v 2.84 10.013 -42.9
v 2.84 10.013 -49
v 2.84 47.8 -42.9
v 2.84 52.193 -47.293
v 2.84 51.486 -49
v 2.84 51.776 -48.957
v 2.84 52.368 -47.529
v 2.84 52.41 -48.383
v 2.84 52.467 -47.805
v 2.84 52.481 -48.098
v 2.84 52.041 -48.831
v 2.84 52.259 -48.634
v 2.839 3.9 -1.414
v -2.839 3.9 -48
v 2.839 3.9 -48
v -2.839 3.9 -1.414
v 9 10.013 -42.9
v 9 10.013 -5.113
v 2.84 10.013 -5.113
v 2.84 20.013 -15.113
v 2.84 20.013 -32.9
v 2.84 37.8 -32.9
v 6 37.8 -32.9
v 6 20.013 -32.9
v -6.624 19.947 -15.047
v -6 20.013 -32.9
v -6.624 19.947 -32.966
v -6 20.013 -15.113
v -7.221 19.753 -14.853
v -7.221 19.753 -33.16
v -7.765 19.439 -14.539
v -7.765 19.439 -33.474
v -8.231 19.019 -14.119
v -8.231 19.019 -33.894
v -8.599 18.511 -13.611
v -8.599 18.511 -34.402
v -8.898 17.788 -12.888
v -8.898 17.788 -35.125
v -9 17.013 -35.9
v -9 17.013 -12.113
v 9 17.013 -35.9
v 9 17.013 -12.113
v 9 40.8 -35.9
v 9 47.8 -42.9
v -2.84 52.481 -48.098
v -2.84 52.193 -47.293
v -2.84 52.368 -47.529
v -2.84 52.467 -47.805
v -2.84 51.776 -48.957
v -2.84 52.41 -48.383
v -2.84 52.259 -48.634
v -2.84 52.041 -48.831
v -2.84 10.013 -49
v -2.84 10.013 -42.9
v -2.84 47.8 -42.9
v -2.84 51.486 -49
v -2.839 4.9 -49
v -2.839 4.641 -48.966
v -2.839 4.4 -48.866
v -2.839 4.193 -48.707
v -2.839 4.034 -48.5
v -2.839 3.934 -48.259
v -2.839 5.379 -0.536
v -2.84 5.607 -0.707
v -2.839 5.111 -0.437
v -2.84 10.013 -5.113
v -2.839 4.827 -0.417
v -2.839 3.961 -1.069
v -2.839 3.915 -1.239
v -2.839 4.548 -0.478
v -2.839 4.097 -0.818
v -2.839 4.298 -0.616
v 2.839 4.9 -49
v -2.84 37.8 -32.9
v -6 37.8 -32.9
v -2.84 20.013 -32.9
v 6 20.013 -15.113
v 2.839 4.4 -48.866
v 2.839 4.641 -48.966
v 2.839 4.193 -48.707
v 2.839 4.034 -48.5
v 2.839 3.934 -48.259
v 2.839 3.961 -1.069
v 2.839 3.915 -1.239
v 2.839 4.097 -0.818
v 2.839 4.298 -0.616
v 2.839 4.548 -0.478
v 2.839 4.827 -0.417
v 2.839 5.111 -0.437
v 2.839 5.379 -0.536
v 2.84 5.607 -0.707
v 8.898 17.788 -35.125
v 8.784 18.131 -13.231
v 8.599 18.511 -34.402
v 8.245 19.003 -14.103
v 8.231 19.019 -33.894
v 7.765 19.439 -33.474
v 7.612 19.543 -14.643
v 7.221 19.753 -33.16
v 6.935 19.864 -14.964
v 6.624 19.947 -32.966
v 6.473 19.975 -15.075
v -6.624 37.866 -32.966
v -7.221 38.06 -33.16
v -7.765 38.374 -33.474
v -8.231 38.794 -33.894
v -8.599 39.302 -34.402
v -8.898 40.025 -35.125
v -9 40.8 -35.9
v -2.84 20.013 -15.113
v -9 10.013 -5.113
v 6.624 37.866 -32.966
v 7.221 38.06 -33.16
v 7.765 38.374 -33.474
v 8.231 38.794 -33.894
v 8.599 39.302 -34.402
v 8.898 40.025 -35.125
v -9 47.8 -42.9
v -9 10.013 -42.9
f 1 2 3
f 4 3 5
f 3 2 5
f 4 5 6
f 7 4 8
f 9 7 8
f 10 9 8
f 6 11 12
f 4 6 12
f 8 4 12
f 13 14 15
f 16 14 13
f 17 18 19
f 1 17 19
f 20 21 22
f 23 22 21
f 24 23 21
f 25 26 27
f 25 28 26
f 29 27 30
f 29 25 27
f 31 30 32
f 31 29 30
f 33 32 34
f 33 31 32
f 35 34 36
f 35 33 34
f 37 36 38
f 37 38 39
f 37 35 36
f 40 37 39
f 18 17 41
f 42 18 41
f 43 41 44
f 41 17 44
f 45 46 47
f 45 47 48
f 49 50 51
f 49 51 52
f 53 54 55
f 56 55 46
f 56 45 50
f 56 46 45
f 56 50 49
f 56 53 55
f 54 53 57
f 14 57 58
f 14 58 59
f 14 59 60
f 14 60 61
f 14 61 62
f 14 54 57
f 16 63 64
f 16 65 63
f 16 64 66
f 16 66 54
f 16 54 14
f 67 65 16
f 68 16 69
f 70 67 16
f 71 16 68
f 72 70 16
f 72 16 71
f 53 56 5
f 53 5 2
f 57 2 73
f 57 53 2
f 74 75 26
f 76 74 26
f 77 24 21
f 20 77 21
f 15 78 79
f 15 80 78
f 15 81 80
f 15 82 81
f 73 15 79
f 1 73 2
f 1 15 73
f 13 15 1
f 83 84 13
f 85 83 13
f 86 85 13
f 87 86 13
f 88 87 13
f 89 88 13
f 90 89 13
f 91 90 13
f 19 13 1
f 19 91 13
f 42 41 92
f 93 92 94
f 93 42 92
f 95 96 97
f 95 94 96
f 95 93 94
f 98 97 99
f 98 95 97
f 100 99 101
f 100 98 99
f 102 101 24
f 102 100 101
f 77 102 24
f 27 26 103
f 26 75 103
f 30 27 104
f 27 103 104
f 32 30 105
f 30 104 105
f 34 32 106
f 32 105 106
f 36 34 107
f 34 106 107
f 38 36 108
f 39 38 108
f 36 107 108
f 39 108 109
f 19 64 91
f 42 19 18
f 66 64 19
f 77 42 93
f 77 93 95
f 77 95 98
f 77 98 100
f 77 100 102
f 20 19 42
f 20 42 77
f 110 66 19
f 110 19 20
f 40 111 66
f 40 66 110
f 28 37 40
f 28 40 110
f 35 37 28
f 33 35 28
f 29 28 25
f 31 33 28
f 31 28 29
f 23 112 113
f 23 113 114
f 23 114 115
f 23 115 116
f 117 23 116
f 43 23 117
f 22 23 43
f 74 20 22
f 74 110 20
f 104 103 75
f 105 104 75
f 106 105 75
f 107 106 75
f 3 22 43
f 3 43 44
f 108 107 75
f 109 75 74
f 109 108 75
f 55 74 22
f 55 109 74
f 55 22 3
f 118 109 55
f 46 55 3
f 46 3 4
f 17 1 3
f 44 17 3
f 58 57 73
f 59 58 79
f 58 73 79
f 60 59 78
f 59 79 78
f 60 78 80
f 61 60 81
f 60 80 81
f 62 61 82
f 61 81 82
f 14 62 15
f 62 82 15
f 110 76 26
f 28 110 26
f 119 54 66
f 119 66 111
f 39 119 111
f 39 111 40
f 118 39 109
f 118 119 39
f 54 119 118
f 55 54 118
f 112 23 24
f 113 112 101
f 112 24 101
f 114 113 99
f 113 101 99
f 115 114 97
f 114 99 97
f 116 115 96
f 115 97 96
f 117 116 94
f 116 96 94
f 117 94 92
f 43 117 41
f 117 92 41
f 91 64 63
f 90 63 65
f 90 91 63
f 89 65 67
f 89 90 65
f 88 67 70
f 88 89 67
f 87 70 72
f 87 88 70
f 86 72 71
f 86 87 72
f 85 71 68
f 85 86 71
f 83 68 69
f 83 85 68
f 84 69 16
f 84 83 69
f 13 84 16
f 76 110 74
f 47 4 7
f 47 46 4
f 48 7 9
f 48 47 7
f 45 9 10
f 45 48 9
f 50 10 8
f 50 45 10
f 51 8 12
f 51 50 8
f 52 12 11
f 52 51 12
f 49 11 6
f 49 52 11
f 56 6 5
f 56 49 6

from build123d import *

# Parameters (mm, degrees)
SKETCH1_R           = 2.1
BOSS_EXTRUDE1_DEPTH = 1
FILLET1_R           = 1
BOSS_EXTRUDE2_DEPTH = 2.84
BOSS_EXTRUDE3_REACH = 76.197
SKETCH9_W           = 18
SKETCH9_H           = 10
SKETCH10_W          = 6.16
SKETCH10_H          = 10
SKETCH10_H_2        = 10.013009375
CUT_EXTRUDE1_DEPTH  = 6.1
BOSS_EXTRUDE4_START = -9
BOSS_EXTRUDE4_DEPTH = 18
CUT_EXTRUDE3_DEPTH  = 75.197102369
FILLET3_R           = 3
FILLET4_R           = 3
FILLET5_R           = 3
FILLET6_R           = 1
FILLET7_R           = 1


# Read off the part's stored shape, not the designer's step: Boss-Extrude4
with BuildPart() as part:
    # Sketch1 → Boss-Extrude1 (new body)
    with BuildSketch(Plane.XY):
        with BuildLine():
            Line((-2.839339828, 3.9), (-5.470710678, 6.53137085))
            ThreePointArc((-5.470710678, 6.53137085), (-5.492387953, 6.563813185), (-5.5, 6.602081528))
            Line((-5.5, 6.602081528), (-5.5, 8.1))
            ThreePointArc((-5.5, 8.1), (-5.470710678, 8.170710678), (-5.4, 8.2))
            Line((-5.4, 8.2), (-3.334418044, 8.2))
            ThreePointArc((-3.334418044, 8.2), (-3.244178397, 8.256909326), (-3.2566483, 8.362863876))
            Line((-3.2566483, 8.362863876), (-4.58, 10))
            Line((-4.58, 10), (-10, 10))
            Line((-10, 10), (-10, 4.58))
            Line((-10, 4.58), (-8.362863876, 3.2566483))
            ThreePointArc((-8.362863876, 3.2566483), (-8.256909326, 3.244178397), (-8.2, 3.334418044))
            Line((-8.2, 3.334418044), (-8.2, 5.4))
            ThreePointArc((-8.2, 5.4), (-8.170710678, 5.470710678), (-8.1, 5.5))
            Line((-8.1, 5.5), (-6.602081528, 5.5))
            ThreePointArc((-6.602081528, 5.5), (-6.563813185, 5.492387953), (-6.53137085, 5.470710678))
            Line((-6.53137085, 5.470710678), (-3.9, 2.839339828))
            Line((-3.9, 2.839339828), (-3.9, -2.839339828))
            Line((-3.9, -2.839339828), (-6.53137085, -5.470710678))
            ThreePointArc((-6.53137085, -5.470710678), (-6.563813185, -5.492387953), (-6.602081528, -5.5))
            Line((-6.602081528, -5.5), (-8.1, -5.5))
            ThreePointArc((-8.1, -5.5), (-8.170710678, -5.470710678), (-8.2, -5.4))
            Line((-8.2, -5.4), (-8.2, -3.334418044))
            ThreePointArc((-8.2, -3.334418044), (-8.256909326, -3.244178397), (-8.362863876, -3.2566483))
            Line((-8.362863876, -3.2566483), (-10, -4.58))
            Line((-10, -4.58), (-10, -10))
            Line((-10, -10), (-4.58, -10))
            Line((-4.58, -10), (-3.2566483, -8.362863876))
            ThreePointArc((-3.2566483, -8.362863876), (-3.244178397, -8.256909326), (-3.334418044, -8.2))
            Line((-3.334418044, -8.2), (-5.4, -8.2))
            ThreePointArc((-5.4, -8.2), (-5.470710678, -8.170710678), (-5.5, -8.1))
            Line((-5.5, -8.1), (-5.5, -6.602081528))
            ThreePointArc((-5.5, -6.602081528), (-5.492387953, -6.563813185), (-5.470710678, -6.53137085))
            Line((-5.470710678, -6.53137085), (-2.839339828, -3.9))
            Line((-2.839339828, -3.9), (2.839339828, -3.9))
            Line((2.839339828, -3.9), (5.470710678, -6.53137085))
            ThreePointArc((5.470710678, -6.53137085), (5.492387953, -6.563813185), (5.5, -6.602081528))
            Line((5.5, -6.602081528), (5.5, -8.1))
            ThreePointArc((5.5, -8.1), (5.470710678, -8.170710678), (5.4, -8.2))
            Line((5.4, -8.2), (3.334418044, -8.2))
            ThreePointArc((3.334418044, -8.2), (3.244178397, -8.256909326), (3.2566483, -8.362863876))
            Line((3.2566483, -8.362863876), (4.58, -10))
            Line((4.58, -10), (10, -10))
            Line((10, -10), (10, -4.58))
            Line((10, -4.58), (8.362863876, -3.2566483))
            ThreePointArc((8.362863876, -3.2566483), (8.256909326, -3.244178397), (8.2, -3.334418044))
            Line((8.2, -3.334418044), (8.2, -5.4))
            ThreePointArc((8.2, -5.4), (8.170710678, -5.470710678), (8.1, -5.5))
            Line((8.1, -5.5), (6.602081528, -5.5))
            ThreePointArc((6.602081528, -5.5), (6.563813185, -5.492387953), (6.53137085, -5.470710678))
            Line((6.53137085, -5.470710678), (3.9, -2.839339828))
            Line((3.9, -2.839339828), (3.9, 2.839339828))
            Line((3.9, 2.839339828), (6.53137085, 5.470710678))
            ThreePointArc((6.53137085, 5.470710678), (6.563813185, 5.492387953), (6.602081528, 5.5))
            Line((6.602081528, 5.5), (8.1, 5.5))
            ThreePointArc((8.1, 5.5), (8.170710678, 5.470710678), (8.2, 5.4))
            Line((8.2, 5.4), (8.2, 3.334418044))
            ThreePointArc((8.2, 3.334418044), (8.256909326, 3.244178397), (8.362863876, 3.2566483))
            Line((8.362863876, 3.2566483), (10, 4.58))
            Line((10, 4.58), (10, 10))
            Line((10, 10), (4.58, 10))
            Line((4.58, 10), (3.2566483, 8.362863876))
            ThreePointArc((3.2566483, 8.362863876), (3.244178397, 8.256909326), (3.334418044, 8.2))
            Line((3.334418044, 8.2), (5.4, 8.2))
            ThreePointArc((5.4, 8.2), (5.470710678, 8.170710678), (5.5, 8.1))
            Line((5.5, 8.1), (5.5, 6.602081528))
            ThreePointArc((5.5, 6.602081528), (5.492387953, 6.563813185), (5.470710678, 6.53137085))
            Line((5.470710678, 6.53137085), (2.839339828, 3.9))
            Line((2.839339828, 3.9), (-2.839339828, 3.9))
        make_face()
        Circle(SKETCH1_R, mode=Mode.SUBTRACT)
    extrude(amount=BOSS_EXTRUDE1_DEPTH)

    # Fillet1
    fillet1_edges = [part.edges().sort_by_distance(p)[0] for p in [
        (10, -10, 0.5),
        (-10, -10, 0.5),
        (-10, 10, 0.5),
        (10, 10, 0.5),
    ]]
    fillet(fillet1_edges, radius=FILLET1_R)


with BuildPart() as body_2:
    # 3DSketch1 → Boss-Extrude2 (new, symmetric)
    with BuildSketch(Plane(origin=(0, 3.9, 1), x_dir=(0, 0.7071067811865477, -0.7071067811865475), z_dir=(-1, 0, 0))):
        Polygon((0, 0), (70.710678119, 0), (35.355339059, 35.355339059), align=None)
    extrude(amount=BOSS_EXTRUDE2_DEPTH, both=True)

    # Boss-Extrude3: up to this plane
    boss_extrude3_end = Plane(origin=(2.84, 3.9, 1), z_dir=(0, 0.7071067811865475, 0.7071067811865476))
    # Sketch9 → Boss-Extrude3 (add, up to the surface)
    with BuildSketch(Plane(origin=(0, 0, -49), x_dir=(-1, 0, 0), z_dir=(0, 0, -1)), mode=Mode.PRIVATE) as boss_extrude3_sk1:
        with Locations((0, 15.013009375)):
            Rectangle(SKETCH9_W, SKETCH9_H)
    boss_extrude3_tool1 = split(extrude(boss_extrude3_sk1.sketch, amount=-BOSS_EXTRUDE3_REACH, mode=Mode.PRIVATE), bisect_by=boss_extrude3_end, keep=Keep.BOTH, mode=Mode.PRIVATE)
    add(boss_extrude3_tool1.solids().sort_by_distance((0, 15.013009, -49))[0])

    # Sketch10 → Cut-Extrude1 (cut)
    with BuildSketch(Plane(origin=(0, 0, -49), x_dir=(-1, 0, 0), z_dir=(0, 0, -1))):
        with Locations((-5.92, 15.013009375)):
            Rectangle(SKETCH10_W, SKETCH10_H)
        with Locations((5.92, 15.006504688)):
            Rectangle(SKETCH10_W, SKETCH10_H_2)
    extrude(amount=-CUT_EXTRUDE1_DEPTH, mode=Mode.SUBTRACT)

    # Boss-Extrude4 outline → Boss-Extrude4 (add)
    with BuildSketch(Plane.YZ.offset(BOSS_EXTRUDE4_START)):
        Polygon((20.013009375, -42.9), (47.8, -42.9), (37.8, -32.9), (20.013009375, -32.9), align=None)
    extrude(amount=BOSS_EXTRUDE4_DEPTH)


with BuildPart() as cut_extrude3_tool:
    # Sketch13 → Cut-Extrude3 (new, through all)
    with BuildSketch(Plane.XY.offset(1)):
        Polygon((-2.839339828, 3.9), (2.839339828, 3.9), (2.84, 10.013009375), (10.658445574, 10.013009375), (10.658445574, -10.0708852), (-2.84, -10.0708852), (-10.475035235, -10.0708852), (-10.475035235, 10.013009375), (-2.84, 10.013009375), align=None)
    extrude(amount=-CUT_EXTRUDE3_DEPTH)


with BuildPart() as part_1:
    add(part.part)

    # Cut-Extrude3: cut by cut_extrude3_tool
    add(cut_extrude3_tool.part, mode=Mode.SUBTRACT)


with BuildPart() as body_2_1:
    add(body_2.part)

    # Cut-Extrude3: cut by cut_extrude3_tool
    add(cut_extrude3_tool.part, mode=Mode.SUBTRACT)

    # Fillet3
    fillet3_edges = [body_2_1.edges().sort_by_distance(p)[0] for p in [
        (9, 20.013009375, -24.006504687),
    ]]
    fillet(fillet3_edges, radius=FILLET3_R)

    # Fillet4
    fillet4_edges = [body_2_1.edges().sort_by_distance(p)[0] for p in [
        (-9, 20.013009375, -24.006504687),
    ]]
    fillet(fillet4_edges, radius=FILLET4_R)

    # Fillet5
    fillet5_edges = [body_2_1.edges().sort_by_distance(p)[0] for p in [
        (9, 27.406504687, -32.9),
        (-9, 27.406504687, -32.9),
    ]]
    fillet(fillet5_edges, radius=FILLET5_R)

    # Fillet6
    fillet6_edges = [body_2_1.edges().sort_by_distance(p)[0] for p in [
        (0, 53.9, -49),
        (0, 3.9, 1),
    ]]
    fillet(fillet6_edges, radius=FILLET6_R)

    # Fillet7
    fillet7_edges = [body_2_1.edges().sort_by_distance(p)[0] for p in [
        (0, 3.9, -49),
    ]]
    fillet(fillet7_edges, radius=FILLET7_R)


solid = body_2_1.part
